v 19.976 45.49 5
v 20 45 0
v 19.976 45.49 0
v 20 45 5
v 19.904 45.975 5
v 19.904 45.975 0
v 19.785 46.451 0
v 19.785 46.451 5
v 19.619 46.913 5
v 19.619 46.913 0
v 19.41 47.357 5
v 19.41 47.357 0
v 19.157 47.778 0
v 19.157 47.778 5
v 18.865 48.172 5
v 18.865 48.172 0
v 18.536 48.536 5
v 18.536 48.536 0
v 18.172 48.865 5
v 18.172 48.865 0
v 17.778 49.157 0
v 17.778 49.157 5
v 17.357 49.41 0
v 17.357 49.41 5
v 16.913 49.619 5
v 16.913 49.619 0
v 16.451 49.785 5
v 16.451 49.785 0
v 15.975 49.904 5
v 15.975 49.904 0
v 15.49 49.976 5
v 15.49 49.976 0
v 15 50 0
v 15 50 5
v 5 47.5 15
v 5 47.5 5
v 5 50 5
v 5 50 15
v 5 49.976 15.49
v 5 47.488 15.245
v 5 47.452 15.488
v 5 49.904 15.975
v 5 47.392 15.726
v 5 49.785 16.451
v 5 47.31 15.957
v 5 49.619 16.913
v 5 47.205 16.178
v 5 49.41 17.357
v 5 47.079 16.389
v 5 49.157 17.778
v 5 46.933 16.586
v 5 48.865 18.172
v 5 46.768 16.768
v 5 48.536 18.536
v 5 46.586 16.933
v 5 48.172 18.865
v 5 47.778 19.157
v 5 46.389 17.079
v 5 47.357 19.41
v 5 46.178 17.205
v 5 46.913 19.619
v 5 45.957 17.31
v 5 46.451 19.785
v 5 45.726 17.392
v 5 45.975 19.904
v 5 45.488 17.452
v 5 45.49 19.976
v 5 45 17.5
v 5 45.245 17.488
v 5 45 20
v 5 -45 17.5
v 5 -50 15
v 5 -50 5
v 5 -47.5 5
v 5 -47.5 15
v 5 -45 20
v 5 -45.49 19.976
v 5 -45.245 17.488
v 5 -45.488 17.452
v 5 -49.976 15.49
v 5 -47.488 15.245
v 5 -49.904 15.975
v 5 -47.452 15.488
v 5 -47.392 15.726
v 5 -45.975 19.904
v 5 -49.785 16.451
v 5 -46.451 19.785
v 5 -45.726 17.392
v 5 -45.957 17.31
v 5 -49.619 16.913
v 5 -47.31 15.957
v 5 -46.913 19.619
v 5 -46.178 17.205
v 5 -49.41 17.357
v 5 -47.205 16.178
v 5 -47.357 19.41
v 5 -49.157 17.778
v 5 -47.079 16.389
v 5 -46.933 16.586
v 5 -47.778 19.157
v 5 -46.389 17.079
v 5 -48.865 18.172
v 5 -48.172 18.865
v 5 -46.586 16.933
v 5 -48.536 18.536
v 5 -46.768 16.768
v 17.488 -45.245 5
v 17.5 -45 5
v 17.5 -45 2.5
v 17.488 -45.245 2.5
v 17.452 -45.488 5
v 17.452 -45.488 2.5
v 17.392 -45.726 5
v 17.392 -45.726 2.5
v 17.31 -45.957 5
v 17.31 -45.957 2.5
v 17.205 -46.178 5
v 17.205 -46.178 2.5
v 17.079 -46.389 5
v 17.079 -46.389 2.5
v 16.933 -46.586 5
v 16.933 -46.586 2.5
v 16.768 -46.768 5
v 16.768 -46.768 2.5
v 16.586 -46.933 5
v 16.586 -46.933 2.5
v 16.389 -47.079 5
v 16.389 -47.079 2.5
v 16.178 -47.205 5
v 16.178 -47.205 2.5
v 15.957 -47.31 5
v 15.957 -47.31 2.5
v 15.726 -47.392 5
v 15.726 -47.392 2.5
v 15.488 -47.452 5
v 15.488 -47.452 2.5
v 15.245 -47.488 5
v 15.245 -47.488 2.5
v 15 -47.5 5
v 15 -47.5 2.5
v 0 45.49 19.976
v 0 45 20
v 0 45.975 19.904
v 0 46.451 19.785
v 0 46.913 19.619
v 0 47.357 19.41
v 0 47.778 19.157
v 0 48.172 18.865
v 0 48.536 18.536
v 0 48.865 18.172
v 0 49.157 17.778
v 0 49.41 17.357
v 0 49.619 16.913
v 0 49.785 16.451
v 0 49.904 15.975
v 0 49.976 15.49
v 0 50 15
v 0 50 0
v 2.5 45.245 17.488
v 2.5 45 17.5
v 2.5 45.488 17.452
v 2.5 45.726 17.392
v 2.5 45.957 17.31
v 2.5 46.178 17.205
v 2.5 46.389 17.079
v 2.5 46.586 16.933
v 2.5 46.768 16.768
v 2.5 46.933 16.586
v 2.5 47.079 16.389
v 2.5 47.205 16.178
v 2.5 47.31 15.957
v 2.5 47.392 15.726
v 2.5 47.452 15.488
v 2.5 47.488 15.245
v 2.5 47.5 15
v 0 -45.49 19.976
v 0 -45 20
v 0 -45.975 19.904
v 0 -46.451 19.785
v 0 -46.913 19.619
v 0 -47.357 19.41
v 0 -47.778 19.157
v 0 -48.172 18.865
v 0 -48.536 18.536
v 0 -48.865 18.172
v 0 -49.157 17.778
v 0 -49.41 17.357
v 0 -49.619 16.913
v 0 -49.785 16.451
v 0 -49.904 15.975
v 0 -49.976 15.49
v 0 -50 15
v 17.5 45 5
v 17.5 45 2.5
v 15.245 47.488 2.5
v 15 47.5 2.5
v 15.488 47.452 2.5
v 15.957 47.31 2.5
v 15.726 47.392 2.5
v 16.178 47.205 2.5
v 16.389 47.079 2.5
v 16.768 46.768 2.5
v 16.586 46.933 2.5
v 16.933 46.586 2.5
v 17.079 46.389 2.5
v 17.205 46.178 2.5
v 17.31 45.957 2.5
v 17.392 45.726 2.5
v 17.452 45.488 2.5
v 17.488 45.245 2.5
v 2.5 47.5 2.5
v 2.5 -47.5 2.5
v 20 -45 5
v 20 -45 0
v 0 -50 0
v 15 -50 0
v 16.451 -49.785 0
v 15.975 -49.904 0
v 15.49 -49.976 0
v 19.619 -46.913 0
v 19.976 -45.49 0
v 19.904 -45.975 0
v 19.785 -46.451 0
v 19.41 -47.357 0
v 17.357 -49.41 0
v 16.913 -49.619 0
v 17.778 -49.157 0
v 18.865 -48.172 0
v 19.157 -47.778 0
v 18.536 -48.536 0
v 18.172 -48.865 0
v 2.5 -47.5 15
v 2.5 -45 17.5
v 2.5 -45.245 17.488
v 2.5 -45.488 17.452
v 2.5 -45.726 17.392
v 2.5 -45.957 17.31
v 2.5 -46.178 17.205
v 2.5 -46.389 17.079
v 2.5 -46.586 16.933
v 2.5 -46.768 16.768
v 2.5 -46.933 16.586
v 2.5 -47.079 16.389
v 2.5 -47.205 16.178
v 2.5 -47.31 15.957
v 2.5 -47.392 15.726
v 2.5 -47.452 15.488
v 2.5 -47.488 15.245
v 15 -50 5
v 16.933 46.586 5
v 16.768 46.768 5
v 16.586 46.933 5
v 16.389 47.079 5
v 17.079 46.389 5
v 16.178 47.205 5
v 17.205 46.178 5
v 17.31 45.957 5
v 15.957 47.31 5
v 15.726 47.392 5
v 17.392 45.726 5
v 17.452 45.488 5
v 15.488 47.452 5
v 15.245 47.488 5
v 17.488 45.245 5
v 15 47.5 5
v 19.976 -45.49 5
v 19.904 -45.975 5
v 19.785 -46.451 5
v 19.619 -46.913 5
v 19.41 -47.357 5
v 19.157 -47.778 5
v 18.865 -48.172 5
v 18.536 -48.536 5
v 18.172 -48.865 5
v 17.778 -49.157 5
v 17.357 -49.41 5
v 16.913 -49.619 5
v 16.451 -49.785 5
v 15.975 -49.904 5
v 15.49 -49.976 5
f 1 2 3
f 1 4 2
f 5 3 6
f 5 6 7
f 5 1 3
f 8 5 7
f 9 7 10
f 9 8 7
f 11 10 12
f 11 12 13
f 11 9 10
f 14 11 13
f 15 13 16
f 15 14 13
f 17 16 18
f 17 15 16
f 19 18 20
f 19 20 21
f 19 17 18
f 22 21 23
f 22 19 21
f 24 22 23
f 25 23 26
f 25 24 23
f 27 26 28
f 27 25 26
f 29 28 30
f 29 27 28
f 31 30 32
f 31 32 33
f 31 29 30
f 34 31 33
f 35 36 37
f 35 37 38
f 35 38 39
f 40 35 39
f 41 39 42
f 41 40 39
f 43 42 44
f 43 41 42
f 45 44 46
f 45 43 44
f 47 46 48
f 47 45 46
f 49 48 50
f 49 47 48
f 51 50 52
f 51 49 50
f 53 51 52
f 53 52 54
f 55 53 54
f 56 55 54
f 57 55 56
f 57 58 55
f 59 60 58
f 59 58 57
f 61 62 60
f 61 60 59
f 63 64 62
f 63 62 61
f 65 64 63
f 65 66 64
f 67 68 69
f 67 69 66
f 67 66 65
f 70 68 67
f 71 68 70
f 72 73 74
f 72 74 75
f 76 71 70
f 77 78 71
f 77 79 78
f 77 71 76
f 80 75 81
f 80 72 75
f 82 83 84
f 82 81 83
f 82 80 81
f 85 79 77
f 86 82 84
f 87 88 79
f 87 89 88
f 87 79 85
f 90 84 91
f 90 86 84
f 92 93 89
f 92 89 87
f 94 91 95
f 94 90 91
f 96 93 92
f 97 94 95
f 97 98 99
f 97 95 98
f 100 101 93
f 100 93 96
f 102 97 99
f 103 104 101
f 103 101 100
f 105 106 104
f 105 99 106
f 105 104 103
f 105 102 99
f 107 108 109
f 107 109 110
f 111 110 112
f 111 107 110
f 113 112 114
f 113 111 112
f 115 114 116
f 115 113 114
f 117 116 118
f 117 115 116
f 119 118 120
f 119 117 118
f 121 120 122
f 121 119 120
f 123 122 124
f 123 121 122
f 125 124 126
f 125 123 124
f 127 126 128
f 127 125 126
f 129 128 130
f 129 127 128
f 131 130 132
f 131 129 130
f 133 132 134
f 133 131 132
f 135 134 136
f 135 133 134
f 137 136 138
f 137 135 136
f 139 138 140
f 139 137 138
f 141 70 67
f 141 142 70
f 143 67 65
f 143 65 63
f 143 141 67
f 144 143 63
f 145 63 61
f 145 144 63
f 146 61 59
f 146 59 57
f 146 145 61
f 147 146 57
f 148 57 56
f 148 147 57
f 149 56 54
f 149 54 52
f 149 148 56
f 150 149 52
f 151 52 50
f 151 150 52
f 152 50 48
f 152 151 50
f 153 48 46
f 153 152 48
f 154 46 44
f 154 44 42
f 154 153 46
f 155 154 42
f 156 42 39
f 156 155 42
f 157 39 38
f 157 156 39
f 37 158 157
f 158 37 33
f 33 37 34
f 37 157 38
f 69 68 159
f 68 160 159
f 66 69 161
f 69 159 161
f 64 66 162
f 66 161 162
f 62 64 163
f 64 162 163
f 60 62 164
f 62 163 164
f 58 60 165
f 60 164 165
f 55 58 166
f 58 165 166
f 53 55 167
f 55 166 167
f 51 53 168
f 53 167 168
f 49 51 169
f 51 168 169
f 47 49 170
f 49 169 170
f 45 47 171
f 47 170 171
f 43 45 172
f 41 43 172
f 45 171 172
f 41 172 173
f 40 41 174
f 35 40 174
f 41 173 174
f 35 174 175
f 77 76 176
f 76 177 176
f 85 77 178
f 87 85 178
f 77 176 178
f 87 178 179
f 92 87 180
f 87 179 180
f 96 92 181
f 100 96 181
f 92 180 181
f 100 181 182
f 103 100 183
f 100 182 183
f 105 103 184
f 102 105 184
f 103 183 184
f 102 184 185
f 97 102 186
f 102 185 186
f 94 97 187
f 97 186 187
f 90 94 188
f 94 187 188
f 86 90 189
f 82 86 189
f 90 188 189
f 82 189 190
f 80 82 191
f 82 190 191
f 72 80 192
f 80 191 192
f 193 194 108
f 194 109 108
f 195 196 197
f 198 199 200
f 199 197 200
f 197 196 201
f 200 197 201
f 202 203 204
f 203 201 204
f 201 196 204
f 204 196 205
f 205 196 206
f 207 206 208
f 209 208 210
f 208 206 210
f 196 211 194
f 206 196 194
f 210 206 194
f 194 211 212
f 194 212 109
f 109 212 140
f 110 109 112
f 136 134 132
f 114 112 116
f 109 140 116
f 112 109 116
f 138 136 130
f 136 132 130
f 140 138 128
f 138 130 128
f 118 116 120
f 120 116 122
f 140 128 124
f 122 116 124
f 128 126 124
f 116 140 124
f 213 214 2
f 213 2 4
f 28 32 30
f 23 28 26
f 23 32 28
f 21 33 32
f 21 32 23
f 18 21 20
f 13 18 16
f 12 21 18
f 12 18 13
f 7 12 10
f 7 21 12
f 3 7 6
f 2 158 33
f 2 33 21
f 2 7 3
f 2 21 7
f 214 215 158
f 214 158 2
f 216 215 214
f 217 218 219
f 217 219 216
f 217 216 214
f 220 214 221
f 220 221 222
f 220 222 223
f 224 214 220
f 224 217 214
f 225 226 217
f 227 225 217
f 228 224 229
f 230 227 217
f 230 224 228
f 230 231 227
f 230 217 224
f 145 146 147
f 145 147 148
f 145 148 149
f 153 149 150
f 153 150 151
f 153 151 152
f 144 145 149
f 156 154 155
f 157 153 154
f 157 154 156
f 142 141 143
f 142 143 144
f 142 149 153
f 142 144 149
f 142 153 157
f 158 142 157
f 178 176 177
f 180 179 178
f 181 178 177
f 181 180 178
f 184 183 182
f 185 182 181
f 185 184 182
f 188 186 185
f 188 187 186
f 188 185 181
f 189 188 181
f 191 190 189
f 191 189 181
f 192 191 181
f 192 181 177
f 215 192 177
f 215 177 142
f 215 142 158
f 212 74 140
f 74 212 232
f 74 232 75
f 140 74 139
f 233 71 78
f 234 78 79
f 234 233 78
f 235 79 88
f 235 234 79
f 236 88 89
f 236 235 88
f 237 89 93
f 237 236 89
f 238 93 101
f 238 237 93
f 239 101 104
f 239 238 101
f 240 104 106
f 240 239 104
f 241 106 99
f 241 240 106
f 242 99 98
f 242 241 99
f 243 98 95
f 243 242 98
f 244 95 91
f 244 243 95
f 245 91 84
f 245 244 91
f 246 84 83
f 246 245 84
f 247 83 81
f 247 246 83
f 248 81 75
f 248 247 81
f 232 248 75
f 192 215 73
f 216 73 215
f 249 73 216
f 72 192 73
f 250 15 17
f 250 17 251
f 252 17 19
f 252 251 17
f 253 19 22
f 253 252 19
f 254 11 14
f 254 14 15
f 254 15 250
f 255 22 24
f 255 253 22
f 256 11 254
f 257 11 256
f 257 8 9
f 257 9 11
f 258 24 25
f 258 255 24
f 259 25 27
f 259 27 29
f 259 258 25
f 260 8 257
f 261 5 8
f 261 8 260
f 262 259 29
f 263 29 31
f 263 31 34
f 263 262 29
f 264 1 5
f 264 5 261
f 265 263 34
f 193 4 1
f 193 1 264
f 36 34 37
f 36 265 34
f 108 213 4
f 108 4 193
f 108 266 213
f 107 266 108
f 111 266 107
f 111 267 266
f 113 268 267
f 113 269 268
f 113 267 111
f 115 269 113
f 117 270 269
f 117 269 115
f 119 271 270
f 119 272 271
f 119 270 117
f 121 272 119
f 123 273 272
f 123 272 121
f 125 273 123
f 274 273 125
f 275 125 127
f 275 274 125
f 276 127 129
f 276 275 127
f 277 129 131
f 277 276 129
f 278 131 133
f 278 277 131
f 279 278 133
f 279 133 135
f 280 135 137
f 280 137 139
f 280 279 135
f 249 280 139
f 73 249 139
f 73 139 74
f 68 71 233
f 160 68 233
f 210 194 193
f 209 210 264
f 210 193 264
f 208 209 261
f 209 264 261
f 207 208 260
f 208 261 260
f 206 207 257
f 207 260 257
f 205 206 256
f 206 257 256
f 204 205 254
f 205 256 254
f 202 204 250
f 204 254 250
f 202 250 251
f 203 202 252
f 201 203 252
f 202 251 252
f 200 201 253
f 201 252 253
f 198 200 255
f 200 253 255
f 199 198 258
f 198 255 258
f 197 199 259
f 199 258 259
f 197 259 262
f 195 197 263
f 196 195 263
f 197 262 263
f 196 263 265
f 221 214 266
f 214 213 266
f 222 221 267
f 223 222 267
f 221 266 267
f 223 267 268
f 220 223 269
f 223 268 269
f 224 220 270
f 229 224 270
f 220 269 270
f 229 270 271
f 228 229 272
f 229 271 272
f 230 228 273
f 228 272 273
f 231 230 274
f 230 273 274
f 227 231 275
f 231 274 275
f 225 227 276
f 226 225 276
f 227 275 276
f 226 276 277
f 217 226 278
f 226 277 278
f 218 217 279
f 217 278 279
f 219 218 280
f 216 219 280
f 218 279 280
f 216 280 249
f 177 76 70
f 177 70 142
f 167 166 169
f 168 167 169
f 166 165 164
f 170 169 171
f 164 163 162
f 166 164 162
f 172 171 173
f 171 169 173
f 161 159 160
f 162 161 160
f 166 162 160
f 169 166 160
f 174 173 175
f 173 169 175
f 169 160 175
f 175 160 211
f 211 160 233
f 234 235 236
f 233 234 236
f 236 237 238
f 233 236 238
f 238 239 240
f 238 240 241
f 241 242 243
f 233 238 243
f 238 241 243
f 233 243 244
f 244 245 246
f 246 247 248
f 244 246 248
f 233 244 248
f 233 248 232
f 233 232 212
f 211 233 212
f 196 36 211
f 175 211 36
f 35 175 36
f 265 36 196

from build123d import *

# Parameters (mm, degrees)
F1_DEPTH = 50
F2_R     = 5
F3_T     = -2.5


with BuildPart() as f1:
    # F0 (on Front) → F1 (new body, symmetric)
    with BuildSketch(Plane.XZ):
        Polygon((0, 20), (0, 0), (20, 0), (20, 5), (5, 5), (5, 20), align=None)
    extrude(amount=F1_DEPTH, both=True)

    # F2
    f2_edges = [f1.edges().sort_by_distance(p)[0] for p in [
        (2.5, -50, 20),
        (2.5, 50, 20),
        (20, -50, 2.5),
        (20, 50, 2.5),
    ]]
    fillet(f2_edges, radius=F2_R)

    # F3
    f3_openings = [f1.faces().sort_by_distance(p)[0] for p in [
        (12.45401, 0, 5),
        (5, 0, 12.45401),
    ]]
    offset(amount=F3_T, openings=f3_openings)


solid = f1.part
